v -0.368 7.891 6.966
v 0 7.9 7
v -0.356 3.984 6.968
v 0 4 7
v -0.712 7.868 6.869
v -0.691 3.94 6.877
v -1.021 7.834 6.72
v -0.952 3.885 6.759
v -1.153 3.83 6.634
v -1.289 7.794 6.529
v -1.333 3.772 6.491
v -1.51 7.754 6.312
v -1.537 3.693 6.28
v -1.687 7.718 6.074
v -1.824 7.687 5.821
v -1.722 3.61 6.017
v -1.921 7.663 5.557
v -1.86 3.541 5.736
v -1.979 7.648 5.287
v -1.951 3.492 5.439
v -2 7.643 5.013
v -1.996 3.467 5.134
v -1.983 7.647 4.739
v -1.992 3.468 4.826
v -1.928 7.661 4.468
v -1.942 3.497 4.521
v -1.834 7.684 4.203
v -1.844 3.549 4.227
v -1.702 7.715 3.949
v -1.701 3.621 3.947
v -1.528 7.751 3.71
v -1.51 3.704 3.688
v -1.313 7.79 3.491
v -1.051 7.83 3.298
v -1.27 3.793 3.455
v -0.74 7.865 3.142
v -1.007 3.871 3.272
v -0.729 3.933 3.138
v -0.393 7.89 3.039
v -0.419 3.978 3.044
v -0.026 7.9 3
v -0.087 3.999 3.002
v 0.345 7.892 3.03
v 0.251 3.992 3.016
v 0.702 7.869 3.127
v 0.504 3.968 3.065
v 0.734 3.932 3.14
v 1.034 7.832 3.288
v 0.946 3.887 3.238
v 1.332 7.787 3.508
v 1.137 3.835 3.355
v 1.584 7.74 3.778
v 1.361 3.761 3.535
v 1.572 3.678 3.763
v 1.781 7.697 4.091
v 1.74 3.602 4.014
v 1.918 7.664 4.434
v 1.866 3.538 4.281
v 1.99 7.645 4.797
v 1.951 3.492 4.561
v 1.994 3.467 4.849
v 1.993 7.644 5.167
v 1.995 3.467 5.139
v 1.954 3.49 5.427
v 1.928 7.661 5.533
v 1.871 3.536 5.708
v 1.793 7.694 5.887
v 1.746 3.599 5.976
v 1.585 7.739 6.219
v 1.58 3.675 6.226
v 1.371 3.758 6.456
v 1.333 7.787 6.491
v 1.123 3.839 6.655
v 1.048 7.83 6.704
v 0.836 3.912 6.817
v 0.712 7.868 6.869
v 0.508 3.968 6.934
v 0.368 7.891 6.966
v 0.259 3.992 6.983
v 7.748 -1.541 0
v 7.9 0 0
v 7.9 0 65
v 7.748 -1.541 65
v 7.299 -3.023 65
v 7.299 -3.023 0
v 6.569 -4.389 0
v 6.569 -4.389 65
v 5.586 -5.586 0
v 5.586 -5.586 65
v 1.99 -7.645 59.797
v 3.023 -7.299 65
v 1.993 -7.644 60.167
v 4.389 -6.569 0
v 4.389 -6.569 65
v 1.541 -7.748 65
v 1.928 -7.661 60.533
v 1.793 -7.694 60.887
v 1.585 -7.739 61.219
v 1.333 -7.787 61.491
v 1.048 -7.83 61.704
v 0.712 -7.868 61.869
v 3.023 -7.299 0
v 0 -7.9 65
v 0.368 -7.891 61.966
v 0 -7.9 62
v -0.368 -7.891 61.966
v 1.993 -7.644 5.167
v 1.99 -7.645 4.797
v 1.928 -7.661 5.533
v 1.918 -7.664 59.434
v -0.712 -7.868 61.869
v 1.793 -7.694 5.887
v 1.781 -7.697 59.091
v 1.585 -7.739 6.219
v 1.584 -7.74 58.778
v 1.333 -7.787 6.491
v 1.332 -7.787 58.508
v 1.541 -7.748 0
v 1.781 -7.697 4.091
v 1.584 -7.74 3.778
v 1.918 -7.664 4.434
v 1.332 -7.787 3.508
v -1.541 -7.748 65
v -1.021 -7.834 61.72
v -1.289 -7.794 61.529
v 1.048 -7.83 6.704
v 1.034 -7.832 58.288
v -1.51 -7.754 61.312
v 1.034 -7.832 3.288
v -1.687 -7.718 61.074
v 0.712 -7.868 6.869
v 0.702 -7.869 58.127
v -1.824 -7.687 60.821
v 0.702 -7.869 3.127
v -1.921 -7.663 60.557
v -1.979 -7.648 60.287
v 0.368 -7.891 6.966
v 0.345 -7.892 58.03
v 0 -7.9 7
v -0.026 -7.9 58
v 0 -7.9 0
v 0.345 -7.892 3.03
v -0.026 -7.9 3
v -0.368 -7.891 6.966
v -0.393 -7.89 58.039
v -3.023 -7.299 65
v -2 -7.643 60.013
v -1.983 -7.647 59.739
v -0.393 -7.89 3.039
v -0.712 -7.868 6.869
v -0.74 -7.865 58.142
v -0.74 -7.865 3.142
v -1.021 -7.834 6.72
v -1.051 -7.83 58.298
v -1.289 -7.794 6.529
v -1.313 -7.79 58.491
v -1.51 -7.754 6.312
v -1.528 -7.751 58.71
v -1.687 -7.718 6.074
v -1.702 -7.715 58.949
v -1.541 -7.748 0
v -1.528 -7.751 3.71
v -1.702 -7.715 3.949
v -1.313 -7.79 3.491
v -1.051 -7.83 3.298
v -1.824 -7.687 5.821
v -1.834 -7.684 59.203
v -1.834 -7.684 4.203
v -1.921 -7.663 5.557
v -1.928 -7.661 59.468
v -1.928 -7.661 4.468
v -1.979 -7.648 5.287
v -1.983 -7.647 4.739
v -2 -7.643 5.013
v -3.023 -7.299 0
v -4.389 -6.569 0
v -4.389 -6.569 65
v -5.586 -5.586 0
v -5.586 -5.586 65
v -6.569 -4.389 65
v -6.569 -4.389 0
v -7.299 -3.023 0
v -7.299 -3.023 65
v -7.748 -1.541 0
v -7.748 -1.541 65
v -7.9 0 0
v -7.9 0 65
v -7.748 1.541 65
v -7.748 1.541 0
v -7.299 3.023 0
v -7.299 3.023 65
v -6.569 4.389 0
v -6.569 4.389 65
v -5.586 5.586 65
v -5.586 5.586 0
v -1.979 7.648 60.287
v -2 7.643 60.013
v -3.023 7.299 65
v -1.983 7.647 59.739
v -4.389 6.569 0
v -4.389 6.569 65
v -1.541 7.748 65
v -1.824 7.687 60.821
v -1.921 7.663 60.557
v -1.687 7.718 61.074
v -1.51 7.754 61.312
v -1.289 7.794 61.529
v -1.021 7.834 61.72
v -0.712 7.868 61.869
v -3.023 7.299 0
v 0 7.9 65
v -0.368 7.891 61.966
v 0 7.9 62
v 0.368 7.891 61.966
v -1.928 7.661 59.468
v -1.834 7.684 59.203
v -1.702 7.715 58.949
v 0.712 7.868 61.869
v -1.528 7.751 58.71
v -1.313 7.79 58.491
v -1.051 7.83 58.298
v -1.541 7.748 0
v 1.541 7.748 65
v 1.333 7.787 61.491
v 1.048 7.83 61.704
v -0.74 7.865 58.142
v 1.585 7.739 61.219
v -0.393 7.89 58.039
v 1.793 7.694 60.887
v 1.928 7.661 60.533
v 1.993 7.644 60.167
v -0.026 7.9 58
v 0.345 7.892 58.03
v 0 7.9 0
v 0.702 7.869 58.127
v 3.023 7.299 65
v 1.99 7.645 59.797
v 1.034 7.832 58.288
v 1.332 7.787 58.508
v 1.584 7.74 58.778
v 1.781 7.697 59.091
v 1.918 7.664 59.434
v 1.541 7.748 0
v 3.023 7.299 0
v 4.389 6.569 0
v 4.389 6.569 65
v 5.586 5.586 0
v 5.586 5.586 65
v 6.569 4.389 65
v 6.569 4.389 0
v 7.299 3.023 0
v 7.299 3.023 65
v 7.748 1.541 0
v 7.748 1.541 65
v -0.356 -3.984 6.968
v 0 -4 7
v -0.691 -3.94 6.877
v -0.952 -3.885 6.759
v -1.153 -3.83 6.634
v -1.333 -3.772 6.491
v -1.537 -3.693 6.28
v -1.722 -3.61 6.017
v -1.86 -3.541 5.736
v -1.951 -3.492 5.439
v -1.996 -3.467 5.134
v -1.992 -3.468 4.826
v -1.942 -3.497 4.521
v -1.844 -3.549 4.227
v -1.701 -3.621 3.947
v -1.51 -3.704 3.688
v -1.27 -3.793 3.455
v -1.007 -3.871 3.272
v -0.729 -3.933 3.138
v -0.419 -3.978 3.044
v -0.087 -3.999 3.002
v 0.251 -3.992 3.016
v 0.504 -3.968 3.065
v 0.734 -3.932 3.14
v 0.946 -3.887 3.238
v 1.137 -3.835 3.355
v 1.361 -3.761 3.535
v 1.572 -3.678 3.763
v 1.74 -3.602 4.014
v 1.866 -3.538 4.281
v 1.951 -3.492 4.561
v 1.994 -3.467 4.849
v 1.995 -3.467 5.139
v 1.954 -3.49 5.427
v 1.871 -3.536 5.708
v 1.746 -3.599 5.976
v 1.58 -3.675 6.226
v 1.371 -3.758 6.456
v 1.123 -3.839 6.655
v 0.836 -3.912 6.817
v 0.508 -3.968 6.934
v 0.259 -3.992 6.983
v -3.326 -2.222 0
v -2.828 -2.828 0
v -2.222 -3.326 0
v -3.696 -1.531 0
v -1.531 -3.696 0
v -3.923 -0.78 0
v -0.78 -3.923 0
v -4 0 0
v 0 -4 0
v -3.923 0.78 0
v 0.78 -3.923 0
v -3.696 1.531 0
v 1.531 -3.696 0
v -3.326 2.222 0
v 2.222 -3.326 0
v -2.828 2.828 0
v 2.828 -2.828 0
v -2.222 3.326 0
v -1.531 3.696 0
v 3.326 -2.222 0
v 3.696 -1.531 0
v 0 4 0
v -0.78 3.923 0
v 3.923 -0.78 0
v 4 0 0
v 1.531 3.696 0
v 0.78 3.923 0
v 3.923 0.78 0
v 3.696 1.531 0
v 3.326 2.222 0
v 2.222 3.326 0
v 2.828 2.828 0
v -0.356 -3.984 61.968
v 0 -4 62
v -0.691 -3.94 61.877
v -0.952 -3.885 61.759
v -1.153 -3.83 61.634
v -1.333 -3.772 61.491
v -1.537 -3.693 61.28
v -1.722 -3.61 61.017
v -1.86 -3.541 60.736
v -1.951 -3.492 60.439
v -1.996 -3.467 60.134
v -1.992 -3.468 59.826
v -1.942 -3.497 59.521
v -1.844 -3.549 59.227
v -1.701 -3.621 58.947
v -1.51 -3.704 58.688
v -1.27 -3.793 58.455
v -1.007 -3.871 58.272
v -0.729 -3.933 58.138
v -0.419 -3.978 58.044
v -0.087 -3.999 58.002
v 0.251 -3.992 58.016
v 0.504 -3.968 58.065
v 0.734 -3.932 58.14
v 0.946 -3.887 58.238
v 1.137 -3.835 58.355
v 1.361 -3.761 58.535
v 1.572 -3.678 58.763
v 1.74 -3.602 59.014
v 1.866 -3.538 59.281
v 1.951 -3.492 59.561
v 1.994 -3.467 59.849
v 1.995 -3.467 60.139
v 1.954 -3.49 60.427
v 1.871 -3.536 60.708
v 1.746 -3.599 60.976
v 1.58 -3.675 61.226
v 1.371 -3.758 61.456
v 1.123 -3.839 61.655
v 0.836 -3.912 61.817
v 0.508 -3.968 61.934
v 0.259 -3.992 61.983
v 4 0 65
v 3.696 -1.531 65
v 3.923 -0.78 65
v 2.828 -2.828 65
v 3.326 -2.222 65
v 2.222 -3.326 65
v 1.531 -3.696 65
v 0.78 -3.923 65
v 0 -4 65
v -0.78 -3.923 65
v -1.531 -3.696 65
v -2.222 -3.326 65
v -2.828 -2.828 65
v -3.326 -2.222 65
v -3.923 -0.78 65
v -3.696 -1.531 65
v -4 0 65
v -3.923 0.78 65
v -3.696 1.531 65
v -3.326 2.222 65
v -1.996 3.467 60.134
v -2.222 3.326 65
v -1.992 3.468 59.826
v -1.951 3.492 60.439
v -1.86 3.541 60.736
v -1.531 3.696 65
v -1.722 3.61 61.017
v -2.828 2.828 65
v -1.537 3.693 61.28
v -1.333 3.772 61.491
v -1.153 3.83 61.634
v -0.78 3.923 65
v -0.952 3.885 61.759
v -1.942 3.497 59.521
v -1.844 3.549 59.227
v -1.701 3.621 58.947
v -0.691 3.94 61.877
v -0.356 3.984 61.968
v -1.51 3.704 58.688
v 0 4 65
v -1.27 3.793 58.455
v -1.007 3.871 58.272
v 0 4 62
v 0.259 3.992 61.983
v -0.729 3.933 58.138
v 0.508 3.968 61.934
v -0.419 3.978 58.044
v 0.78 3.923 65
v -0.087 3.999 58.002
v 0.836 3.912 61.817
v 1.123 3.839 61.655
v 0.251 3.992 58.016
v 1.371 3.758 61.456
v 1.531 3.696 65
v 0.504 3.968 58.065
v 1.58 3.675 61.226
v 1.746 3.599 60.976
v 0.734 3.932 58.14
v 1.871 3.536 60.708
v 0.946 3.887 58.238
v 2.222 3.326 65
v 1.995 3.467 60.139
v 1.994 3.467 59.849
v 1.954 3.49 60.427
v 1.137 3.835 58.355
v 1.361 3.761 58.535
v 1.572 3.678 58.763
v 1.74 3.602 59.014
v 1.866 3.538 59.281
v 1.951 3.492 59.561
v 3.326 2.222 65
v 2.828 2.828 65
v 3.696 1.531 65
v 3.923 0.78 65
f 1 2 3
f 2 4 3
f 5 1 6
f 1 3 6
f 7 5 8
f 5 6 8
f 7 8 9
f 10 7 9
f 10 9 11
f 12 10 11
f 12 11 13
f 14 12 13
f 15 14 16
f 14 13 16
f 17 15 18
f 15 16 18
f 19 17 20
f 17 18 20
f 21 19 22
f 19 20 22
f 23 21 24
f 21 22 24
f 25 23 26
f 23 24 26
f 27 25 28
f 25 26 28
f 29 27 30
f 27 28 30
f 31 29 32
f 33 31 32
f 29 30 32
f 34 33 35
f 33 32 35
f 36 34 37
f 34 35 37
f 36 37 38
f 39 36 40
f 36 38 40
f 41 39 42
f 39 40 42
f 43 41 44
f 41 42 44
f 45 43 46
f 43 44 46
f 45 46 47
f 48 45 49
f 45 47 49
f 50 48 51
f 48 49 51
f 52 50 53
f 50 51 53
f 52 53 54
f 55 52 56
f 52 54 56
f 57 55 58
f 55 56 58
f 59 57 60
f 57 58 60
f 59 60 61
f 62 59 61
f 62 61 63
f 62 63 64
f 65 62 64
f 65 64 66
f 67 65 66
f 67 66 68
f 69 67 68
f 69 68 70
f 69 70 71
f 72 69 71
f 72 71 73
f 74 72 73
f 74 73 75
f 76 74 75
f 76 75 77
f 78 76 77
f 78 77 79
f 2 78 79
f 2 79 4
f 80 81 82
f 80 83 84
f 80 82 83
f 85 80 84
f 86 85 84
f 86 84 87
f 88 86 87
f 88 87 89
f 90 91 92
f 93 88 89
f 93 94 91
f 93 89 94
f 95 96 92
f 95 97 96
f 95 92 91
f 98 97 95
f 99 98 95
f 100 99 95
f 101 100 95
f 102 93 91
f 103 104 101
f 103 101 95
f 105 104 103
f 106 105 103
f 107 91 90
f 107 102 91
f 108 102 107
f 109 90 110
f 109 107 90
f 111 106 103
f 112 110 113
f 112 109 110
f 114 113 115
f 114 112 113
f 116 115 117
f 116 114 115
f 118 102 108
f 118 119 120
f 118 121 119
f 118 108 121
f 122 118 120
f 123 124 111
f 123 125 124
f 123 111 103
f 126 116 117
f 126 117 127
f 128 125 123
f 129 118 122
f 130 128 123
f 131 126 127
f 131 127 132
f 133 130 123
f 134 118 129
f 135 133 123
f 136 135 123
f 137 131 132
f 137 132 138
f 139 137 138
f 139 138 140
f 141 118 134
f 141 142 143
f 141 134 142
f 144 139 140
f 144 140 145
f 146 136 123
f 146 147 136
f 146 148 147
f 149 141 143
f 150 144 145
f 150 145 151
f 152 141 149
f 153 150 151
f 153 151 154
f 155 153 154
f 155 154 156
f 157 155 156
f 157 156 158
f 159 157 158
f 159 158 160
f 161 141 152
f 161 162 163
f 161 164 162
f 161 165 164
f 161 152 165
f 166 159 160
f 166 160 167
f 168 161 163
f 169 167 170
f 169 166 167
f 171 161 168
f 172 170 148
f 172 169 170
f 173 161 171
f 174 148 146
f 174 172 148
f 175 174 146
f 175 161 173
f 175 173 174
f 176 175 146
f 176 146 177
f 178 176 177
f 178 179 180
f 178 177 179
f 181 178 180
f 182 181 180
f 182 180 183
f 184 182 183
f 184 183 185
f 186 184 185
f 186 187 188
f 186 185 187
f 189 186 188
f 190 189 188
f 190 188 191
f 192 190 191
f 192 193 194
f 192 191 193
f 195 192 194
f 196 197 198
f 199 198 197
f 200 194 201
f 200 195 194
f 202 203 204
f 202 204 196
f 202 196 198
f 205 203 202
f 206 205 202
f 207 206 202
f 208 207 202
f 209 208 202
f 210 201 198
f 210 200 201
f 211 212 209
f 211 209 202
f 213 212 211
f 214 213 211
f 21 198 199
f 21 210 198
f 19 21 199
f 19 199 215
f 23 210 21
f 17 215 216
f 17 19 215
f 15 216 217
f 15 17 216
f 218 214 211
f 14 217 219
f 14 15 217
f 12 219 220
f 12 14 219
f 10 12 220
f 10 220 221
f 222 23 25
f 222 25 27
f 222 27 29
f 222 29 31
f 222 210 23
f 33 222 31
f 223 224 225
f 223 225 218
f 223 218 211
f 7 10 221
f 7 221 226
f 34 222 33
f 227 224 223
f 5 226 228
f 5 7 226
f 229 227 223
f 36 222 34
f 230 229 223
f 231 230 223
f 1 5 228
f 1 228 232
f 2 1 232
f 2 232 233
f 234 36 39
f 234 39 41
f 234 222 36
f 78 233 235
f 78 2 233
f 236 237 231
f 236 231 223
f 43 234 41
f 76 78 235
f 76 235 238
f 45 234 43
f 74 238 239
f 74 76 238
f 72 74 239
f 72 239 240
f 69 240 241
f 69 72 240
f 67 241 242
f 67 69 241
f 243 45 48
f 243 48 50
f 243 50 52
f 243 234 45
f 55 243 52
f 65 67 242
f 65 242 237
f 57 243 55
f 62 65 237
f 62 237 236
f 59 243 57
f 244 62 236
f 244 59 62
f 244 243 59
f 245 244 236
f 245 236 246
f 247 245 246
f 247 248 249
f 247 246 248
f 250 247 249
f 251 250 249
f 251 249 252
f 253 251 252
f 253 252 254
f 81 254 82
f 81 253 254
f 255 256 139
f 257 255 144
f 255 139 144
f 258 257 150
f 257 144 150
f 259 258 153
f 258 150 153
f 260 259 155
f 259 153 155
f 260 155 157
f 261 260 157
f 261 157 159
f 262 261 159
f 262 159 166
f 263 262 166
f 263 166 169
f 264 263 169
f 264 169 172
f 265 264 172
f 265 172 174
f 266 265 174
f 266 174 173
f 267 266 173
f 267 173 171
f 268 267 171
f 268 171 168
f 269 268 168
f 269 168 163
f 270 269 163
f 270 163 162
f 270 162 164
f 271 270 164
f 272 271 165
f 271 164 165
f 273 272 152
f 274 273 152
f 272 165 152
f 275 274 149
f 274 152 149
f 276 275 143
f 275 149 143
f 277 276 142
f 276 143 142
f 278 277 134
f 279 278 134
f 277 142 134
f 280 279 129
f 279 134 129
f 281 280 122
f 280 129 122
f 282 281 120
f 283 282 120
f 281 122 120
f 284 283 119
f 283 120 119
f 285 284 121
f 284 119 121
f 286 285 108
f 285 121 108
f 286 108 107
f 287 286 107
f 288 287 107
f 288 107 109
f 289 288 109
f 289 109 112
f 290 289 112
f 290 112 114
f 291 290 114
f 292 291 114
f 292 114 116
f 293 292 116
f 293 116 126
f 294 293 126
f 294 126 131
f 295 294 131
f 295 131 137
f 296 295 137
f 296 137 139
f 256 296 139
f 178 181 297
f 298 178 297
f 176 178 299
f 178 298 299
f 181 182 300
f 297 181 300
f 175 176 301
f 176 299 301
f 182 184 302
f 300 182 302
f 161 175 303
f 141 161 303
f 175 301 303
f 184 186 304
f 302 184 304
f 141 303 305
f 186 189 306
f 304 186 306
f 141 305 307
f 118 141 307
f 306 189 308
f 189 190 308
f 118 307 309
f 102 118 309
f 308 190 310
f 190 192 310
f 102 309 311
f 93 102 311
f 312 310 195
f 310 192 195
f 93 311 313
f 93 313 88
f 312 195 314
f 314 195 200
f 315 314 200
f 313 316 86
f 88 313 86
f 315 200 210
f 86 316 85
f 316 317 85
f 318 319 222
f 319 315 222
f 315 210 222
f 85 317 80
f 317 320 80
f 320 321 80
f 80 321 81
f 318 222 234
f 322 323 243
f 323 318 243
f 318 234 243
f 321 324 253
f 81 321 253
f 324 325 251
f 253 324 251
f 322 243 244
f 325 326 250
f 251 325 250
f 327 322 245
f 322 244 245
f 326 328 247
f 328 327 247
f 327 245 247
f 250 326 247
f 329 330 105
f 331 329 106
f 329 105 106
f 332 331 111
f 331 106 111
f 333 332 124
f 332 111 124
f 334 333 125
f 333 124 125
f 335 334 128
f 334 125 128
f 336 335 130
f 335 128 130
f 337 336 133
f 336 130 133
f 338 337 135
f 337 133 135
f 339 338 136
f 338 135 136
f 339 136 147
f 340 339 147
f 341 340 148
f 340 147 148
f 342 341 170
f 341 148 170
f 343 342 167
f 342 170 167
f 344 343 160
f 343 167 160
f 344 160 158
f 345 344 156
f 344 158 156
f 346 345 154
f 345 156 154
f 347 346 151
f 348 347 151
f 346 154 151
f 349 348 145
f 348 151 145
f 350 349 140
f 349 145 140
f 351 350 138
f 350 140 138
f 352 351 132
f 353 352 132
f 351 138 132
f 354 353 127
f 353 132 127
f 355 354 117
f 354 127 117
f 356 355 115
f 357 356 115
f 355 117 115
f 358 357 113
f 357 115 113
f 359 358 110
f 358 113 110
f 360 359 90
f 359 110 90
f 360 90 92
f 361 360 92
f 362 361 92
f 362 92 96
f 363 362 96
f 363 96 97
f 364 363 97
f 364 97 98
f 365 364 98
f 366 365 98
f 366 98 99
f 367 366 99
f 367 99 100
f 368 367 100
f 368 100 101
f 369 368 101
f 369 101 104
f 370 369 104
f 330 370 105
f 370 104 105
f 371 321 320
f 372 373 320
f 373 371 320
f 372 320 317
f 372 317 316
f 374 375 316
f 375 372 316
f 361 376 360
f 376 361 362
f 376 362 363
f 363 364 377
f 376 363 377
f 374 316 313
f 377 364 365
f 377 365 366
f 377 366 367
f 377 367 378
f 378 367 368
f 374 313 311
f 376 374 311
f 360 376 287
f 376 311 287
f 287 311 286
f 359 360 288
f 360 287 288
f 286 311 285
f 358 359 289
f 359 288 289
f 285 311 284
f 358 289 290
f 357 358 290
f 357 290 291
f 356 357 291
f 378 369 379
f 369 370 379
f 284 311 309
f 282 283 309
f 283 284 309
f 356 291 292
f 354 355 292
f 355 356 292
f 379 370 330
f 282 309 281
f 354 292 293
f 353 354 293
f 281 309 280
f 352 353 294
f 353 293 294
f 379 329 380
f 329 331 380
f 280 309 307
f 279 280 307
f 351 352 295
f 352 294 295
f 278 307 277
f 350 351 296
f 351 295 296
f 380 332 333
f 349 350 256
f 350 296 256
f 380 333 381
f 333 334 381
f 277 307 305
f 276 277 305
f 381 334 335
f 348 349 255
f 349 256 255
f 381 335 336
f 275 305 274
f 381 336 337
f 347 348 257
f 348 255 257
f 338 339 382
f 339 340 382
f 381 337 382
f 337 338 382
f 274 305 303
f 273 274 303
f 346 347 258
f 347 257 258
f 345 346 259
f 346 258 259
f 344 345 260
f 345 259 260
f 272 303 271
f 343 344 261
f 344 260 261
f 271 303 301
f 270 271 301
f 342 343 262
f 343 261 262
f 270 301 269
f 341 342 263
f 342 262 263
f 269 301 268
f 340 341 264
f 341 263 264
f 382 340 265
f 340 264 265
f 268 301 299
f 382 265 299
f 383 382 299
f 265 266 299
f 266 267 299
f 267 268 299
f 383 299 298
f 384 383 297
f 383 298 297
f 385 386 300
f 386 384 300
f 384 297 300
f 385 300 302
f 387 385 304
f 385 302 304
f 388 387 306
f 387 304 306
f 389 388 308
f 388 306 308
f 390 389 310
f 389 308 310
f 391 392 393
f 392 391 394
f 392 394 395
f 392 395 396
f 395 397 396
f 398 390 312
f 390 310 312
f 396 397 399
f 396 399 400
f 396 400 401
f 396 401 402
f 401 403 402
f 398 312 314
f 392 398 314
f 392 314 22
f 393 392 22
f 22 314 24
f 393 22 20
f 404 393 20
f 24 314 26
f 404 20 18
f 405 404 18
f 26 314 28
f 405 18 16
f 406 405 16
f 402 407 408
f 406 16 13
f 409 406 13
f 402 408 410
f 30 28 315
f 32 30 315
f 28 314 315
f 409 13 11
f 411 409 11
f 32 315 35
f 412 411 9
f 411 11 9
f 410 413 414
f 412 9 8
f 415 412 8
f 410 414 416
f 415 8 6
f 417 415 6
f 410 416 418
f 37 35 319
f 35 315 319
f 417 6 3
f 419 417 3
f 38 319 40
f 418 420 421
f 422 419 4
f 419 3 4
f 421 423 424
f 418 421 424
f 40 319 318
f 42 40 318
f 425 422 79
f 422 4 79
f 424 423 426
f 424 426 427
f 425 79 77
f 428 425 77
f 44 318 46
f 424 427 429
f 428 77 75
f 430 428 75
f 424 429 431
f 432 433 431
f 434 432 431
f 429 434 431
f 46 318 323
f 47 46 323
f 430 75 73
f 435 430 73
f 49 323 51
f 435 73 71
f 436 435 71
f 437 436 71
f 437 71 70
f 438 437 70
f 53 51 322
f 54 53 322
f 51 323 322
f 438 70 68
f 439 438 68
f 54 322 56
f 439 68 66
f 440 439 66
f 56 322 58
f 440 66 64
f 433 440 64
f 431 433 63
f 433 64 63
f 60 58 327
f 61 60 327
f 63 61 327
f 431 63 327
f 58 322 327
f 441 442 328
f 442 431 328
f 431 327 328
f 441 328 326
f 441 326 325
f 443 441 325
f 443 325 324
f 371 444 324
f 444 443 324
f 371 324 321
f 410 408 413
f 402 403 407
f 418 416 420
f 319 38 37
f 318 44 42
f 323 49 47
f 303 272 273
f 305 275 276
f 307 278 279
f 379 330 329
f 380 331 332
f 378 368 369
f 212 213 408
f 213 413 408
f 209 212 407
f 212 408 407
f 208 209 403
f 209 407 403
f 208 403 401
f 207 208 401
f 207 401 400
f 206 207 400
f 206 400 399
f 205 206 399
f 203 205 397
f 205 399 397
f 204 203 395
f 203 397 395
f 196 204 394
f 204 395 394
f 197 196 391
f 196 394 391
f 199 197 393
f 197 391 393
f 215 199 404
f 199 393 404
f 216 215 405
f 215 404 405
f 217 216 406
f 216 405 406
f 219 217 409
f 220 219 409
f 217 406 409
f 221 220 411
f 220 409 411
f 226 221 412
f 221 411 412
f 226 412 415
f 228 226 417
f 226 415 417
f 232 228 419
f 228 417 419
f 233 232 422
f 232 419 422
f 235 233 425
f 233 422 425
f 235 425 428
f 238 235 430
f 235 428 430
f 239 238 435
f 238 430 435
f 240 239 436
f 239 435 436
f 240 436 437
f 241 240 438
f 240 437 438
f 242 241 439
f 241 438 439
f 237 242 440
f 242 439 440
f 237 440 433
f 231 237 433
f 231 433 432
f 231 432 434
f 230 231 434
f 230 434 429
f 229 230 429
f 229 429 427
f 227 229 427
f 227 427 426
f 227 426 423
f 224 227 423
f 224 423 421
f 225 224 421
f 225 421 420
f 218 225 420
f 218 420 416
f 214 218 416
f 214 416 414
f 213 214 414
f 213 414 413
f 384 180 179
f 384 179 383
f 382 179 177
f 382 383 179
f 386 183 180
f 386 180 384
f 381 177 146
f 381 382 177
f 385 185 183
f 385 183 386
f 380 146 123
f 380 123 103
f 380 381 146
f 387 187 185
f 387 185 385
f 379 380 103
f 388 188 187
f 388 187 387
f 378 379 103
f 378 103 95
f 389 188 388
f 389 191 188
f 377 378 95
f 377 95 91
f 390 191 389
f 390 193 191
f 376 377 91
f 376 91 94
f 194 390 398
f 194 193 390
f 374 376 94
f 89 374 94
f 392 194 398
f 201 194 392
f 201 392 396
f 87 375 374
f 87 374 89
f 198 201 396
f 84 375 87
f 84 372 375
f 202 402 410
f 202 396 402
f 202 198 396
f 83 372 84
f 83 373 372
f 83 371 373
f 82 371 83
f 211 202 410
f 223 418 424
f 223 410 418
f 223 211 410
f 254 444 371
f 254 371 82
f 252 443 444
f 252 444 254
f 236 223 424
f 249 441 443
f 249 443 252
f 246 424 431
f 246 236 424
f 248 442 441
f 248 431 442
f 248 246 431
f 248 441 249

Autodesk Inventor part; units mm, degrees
ref_plane "YZ Plane" through (0, 0, 0) normal (1, 0, 0) x (0, 1, 0)
ref_plane "XZ Plane" through (0, 0, 0) normal (0, 1, 0) x (-1, 0, 0)
ref_plane "XY Plane" through (0, 0, 0) normal (0, 0, 1) x (1, 0, 0)
sketch "Esquisse1" plane through (0, 0, 0) normal (0, 0, 1) x (1, 0, 0)
  circle A0 centre (0, 0) radius 7.9
  circle A1 centre (0, 0) radius 4
  dimension "d0" = 15.8
  dimension "d1" = 8
extrude "Extrusion1" add sketch "Esquisse1" along normal blind 65
sketch "Esquisse2" plane through (0, 0, 0) normal (0, 1, 0) x (-1, 0, 0)
  line L0 (7.9, 65) -> (-7.9, 65) projected
  line L1 (0, 65) -> (0, 60)
  line L2 (0, 0) -> (0, 5)
  dimension "d4" = 5
  dimension "d5" = 5
hole "Perçage1" at (0, 0, 60) at (0, 0, 5) direction (0, -1, 0) diameter 4 end through all both
properties part number "tube vers roue libre"
